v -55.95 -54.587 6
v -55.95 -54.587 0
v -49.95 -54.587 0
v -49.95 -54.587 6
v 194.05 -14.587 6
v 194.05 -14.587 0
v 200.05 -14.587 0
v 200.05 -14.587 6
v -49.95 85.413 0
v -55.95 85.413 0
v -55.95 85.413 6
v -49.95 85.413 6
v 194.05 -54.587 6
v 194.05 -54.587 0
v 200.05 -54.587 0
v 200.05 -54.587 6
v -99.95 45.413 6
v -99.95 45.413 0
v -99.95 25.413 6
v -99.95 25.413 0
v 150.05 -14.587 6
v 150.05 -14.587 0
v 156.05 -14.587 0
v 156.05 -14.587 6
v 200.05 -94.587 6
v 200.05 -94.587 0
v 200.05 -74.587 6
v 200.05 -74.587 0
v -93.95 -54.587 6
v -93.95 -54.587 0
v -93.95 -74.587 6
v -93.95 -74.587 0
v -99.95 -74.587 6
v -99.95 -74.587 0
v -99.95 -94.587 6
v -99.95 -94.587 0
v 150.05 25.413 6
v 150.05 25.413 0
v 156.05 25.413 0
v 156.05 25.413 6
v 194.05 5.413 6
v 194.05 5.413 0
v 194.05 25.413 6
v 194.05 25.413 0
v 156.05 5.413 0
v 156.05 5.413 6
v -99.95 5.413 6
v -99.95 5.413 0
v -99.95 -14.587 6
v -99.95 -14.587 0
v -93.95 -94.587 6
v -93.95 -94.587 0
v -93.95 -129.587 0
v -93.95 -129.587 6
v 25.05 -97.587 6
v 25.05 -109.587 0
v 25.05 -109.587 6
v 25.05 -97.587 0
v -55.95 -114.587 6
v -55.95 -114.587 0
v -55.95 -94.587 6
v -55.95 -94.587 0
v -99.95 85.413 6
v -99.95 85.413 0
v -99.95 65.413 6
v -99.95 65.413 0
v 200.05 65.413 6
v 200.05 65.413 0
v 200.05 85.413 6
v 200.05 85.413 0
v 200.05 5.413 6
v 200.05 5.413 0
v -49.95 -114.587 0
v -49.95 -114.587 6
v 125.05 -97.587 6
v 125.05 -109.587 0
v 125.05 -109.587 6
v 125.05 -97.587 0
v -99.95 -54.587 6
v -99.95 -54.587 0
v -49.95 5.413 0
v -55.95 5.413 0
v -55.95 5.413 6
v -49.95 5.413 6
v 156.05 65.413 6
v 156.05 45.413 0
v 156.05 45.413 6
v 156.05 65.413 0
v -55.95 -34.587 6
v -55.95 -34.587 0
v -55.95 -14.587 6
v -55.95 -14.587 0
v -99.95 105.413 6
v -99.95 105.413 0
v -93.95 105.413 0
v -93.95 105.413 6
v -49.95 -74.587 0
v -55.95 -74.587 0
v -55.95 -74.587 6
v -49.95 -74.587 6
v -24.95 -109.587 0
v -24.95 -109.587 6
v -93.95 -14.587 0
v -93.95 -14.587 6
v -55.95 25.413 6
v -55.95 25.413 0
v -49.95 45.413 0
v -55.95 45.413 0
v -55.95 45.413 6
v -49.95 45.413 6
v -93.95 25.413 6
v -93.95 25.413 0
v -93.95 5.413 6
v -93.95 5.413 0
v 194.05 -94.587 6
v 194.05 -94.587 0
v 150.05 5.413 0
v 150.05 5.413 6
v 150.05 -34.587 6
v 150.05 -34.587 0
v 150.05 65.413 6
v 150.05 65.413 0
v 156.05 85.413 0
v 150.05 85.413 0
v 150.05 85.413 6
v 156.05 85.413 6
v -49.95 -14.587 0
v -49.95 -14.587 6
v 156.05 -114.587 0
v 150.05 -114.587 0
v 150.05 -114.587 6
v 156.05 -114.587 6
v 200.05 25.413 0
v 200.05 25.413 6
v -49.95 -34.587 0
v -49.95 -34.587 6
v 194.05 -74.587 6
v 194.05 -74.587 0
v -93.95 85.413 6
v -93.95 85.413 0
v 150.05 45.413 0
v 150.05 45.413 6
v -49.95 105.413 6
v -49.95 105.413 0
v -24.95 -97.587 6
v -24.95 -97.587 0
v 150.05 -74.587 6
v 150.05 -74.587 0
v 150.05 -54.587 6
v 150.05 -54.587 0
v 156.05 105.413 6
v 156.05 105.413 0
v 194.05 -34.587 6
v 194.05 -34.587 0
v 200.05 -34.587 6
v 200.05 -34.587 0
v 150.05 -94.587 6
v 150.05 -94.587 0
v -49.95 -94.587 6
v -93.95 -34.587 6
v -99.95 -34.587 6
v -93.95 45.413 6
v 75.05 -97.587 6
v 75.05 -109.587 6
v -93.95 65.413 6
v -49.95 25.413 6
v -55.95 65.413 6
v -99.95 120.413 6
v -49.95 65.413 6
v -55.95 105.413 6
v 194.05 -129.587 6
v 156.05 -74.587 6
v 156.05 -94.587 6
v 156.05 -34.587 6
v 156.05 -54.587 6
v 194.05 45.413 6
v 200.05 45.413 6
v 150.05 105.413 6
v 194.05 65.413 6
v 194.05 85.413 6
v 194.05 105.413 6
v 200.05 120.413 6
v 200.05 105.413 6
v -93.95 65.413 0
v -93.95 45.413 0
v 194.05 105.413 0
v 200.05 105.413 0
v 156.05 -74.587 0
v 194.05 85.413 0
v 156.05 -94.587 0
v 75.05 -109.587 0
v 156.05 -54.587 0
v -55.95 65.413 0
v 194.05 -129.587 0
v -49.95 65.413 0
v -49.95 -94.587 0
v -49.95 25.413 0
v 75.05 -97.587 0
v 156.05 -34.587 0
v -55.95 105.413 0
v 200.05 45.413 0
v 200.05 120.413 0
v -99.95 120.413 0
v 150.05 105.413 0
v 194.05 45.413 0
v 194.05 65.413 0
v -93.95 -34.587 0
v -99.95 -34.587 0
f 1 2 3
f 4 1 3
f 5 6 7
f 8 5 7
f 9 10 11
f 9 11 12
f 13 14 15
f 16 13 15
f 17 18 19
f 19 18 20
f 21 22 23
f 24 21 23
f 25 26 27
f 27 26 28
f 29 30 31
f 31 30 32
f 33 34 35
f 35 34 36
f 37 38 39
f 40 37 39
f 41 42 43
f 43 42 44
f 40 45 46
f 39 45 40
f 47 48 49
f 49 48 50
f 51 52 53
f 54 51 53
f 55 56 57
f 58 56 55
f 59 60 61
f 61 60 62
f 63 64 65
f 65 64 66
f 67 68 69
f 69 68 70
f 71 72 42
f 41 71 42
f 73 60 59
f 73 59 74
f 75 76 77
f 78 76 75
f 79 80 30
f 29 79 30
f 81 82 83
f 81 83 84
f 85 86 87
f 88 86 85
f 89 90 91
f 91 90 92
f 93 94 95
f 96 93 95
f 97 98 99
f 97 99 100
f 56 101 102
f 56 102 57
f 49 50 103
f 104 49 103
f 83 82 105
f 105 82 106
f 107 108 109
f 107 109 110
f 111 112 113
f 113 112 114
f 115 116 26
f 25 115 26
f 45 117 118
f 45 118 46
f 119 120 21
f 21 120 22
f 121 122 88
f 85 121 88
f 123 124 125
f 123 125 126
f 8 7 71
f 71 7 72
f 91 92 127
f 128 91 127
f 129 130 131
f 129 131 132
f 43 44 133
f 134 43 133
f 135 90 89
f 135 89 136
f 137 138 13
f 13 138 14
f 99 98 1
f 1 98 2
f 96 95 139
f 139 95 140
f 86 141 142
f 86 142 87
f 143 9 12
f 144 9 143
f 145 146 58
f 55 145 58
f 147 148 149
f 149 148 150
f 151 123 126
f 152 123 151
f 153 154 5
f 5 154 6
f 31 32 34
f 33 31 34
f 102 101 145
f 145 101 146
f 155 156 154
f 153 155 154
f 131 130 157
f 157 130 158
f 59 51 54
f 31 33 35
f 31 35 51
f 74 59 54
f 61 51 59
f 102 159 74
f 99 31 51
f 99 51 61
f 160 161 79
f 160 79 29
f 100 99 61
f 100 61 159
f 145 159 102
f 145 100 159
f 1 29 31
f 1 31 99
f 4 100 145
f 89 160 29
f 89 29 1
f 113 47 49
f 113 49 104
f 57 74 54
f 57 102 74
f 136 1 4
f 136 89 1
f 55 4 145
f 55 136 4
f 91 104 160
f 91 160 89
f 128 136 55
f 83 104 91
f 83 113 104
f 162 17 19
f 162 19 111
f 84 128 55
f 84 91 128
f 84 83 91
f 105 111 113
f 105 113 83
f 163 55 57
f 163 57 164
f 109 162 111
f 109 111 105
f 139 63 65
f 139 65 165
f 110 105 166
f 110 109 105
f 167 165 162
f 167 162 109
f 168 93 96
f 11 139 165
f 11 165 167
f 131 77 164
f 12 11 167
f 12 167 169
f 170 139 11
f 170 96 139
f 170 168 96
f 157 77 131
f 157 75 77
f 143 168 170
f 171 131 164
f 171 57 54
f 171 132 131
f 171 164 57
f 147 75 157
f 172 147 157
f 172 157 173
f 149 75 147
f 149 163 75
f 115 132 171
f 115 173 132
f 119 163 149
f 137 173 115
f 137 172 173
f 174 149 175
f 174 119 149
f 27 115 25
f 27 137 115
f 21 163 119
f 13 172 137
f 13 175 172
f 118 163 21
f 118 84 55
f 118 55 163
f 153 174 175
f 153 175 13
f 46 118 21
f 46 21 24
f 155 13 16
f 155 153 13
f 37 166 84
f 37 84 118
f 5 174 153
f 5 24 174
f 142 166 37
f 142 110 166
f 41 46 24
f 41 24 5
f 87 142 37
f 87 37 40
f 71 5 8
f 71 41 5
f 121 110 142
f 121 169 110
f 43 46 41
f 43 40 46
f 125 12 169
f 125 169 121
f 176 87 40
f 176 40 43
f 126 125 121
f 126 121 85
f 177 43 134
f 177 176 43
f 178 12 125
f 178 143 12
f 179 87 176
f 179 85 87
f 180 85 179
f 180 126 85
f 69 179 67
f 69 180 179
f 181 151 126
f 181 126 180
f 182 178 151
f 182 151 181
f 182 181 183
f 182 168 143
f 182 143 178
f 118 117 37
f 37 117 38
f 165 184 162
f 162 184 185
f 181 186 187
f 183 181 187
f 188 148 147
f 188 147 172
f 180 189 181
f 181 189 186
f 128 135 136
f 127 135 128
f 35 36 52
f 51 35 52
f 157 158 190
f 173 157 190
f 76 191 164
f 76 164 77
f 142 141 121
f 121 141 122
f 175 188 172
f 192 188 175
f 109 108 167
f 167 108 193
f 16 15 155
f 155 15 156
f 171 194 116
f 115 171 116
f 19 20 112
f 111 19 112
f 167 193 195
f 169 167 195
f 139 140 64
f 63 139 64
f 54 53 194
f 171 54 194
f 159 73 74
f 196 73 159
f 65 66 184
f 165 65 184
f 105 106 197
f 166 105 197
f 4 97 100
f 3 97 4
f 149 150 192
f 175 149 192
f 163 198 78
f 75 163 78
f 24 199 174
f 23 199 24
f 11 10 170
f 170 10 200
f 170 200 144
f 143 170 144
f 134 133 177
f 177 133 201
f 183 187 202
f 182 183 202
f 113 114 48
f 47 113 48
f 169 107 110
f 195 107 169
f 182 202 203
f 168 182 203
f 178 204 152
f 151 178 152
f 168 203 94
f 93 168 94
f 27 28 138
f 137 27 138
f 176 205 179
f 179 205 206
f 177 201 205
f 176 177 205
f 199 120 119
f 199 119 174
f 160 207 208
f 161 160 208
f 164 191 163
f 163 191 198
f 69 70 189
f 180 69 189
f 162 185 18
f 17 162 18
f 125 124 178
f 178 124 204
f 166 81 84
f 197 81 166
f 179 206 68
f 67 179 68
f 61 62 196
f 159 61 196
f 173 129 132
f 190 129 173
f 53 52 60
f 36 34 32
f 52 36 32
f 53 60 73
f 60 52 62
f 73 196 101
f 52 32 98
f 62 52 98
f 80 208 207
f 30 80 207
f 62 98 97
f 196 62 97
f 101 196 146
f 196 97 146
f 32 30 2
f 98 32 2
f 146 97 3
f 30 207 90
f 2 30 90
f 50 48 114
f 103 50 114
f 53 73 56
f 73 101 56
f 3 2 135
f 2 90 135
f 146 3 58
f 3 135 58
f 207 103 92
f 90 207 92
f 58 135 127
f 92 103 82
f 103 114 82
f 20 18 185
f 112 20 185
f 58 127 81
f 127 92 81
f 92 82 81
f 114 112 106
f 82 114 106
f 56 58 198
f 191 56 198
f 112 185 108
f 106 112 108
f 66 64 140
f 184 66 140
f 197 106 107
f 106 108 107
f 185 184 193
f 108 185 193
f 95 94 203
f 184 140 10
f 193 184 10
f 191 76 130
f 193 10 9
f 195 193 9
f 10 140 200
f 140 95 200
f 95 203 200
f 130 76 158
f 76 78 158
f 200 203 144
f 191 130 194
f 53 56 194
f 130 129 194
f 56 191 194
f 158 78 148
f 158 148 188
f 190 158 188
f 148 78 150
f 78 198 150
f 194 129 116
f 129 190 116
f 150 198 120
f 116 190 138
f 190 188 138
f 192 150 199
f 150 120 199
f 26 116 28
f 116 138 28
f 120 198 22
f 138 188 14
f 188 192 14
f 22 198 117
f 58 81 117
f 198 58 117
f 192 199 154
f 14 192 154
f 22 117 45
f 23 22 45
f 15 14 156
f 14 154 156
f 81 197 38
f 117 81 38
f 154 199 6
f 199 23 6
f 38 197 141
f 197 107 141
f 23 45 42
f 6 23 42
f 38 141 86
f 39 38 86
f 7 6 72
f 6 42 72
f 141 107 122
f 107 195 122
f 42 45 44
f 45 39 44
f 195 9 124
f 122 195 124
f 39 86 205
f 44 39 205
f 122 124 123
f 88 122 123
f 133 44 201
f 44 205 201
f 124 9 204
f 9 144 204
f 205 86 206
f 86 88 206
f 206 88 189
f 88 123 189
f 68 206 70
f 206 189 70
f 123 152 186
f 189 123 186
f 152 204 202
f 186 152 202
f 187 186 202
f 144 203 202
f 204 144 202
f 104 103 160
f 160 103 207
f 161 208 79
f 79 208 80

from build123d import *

# Parameters (mm, degrees)
SKETCH_1_W      = 50
SKETCH_1_H      = 12
SKETCH_1_W_2    = 6
SKETCH_1_H_2    = 20
EXTRUDE_1_DEPTH = 6


with BuildPart() as part:
    # 草图1 → 凸台-拉伸1 (new body)
    with BuildSketch(Plane.XY):
        Polygon((-99.950071484, 5.412625096), (-99.950071484, -14.587374904), (-93.950071484, -14.587374904), (-93.950071484, -34.587374904), (-99.950071484, -34.587374904), (-99.950071484, -54.587374904), (-93.950071484, -54.587374904), (-93.950071484, -74.587374904), (-99.950071484, -74.587374904), (-99.950071484, -94.587374904), (-93.950071484, -94.587374904), (-93.950071484, -129.587374904), (194.049928516, -129.587374904), (194.049928516, -94.587374904), (200.049928516, -94.587374904), (200.049928516, -74.587374904), (194.049928516, -74.587374904), (194.049928516, -54.587374904), (200.049928516, -54.587374904), (200.049928516, -34.587374904), (194.049928516, -34.587374904), (194.049928516, -14.587374904), (200.049928516, -14.587374904), (200.049928516, 5.412625096), (194.049928516, 5.412625096), (194.049928516, 25.412625096), (200.049928516, 25.412625096), (200.049928516, 45.412625096), (194.049928516, 45.412625096), (194.049928516, 65.412625096), (200.049928516, 65.412625096), (200.049928516, 85.412625096), (194.049928516, 85.412625096), (194.049928516, 105.412625096), (200.049928516, 105.412625096), (200.049928516, 120.412625096), (194.049928516, 120.412625096), (-93.950071484, 120.412625096), (-99.950071484, 120.412625096), (-99.950071484, 105.412625096), (-93.950071484, 105.412625096), (-93.950071484, 85.412625096), (-99.950071484, 85.412625096), (-99.950071484, 65.412625096), (-93.950071484, 65.412625096), (-93.950071484, 45.412625096), (-99.950071484, 45.412625096), (-99.950071484, 25.412625096), (-93.950071484, 25.412625096), (-93.950071484, 5.412625096), align=None)
        with Locations((100.049928516, -103.587374904)):
            Rectangle(SKETCH_1_W, SKETCH_1_H, mode=Mode.SUBTRACT)
        with Locations((153.049928516, 15.412625096)):
            Rectangle(SKETCH_1_W_2, SKETCH_1_H_2, mode=Mode.SUBTRACT)
        with Locations((153.049928516, -64.587374904)):
            Rectangle(SKETCH_1_W_2, SKETCH_1_H_2, mode=Mode.SUBTRACT)
        with Locations((153.049928516, 55.412625096)):
            Rectangle(SKETCH_1_W_2, SKETCH_1_H_2, mode=Mode.SUBTRACT)
        with Locations((153.049928516, -104.587374904)):
            Rectangle(SKETCH_1_W_2, SKETCH_1_H_2, mode=Mode.SUBTRACT)
        with Locations((153.049928516, 95.412625096)):
            Rectangle(SKETCH_1_W_2, SKETCH_1_H_2, mode=Mode.SUBTRACT)
        with Locations((153.049928516, -24.587374904)):
            Rectangle(SKETCH_1_W_2, SKETCH_1_H_2, mode=Mode.SUBTRACT)
        with Locations((-52.950071484, -24.587374904)):
            Rectangle(SKETCH_1_W_2, SKETCH_1_H_2, mode=Mode.SUBTRACT)
        with Locations((-52.950071484, -64.587374904)):
            Rectangle(SKETCH_1_W_2, SKETCH_1_H_2, mode=Mode.SUBTRACT)
        with Locations((-52.950071484, -104.587374904)):
            Rectangle(SKETCH_1_W_2, SKETCH_1_H_2, mode=Mode.SUBTRACT)
        with Locations((-52.950071484, 55.412625096)):
            Rectangle(SKETCH_1_W_2, SKETCH_1_H_2, mode=Mode.SUBTRACT)
        with Locations((-52.950071484, 95.412625096)):
            Rectangle(SKETCH_1_W_2, SKETCH_1_H_2, mode=Mode.SUBTRACT)
        with Locations((-52.950071484, 15.412625096)):
            Rectangle(SKETCH_1_W_2, SKETCH_1_H_2, mode=Mode.SUBTRACT)
        with Locations((0.049928516, -103.587374904)):
            Rectangle(SKETCH_1_W, SKETCH_1_H, mode=Mode.SUBTRACT)
    extrude(amount=EXTRUDE_1_DEPTH)


solid = part.part
